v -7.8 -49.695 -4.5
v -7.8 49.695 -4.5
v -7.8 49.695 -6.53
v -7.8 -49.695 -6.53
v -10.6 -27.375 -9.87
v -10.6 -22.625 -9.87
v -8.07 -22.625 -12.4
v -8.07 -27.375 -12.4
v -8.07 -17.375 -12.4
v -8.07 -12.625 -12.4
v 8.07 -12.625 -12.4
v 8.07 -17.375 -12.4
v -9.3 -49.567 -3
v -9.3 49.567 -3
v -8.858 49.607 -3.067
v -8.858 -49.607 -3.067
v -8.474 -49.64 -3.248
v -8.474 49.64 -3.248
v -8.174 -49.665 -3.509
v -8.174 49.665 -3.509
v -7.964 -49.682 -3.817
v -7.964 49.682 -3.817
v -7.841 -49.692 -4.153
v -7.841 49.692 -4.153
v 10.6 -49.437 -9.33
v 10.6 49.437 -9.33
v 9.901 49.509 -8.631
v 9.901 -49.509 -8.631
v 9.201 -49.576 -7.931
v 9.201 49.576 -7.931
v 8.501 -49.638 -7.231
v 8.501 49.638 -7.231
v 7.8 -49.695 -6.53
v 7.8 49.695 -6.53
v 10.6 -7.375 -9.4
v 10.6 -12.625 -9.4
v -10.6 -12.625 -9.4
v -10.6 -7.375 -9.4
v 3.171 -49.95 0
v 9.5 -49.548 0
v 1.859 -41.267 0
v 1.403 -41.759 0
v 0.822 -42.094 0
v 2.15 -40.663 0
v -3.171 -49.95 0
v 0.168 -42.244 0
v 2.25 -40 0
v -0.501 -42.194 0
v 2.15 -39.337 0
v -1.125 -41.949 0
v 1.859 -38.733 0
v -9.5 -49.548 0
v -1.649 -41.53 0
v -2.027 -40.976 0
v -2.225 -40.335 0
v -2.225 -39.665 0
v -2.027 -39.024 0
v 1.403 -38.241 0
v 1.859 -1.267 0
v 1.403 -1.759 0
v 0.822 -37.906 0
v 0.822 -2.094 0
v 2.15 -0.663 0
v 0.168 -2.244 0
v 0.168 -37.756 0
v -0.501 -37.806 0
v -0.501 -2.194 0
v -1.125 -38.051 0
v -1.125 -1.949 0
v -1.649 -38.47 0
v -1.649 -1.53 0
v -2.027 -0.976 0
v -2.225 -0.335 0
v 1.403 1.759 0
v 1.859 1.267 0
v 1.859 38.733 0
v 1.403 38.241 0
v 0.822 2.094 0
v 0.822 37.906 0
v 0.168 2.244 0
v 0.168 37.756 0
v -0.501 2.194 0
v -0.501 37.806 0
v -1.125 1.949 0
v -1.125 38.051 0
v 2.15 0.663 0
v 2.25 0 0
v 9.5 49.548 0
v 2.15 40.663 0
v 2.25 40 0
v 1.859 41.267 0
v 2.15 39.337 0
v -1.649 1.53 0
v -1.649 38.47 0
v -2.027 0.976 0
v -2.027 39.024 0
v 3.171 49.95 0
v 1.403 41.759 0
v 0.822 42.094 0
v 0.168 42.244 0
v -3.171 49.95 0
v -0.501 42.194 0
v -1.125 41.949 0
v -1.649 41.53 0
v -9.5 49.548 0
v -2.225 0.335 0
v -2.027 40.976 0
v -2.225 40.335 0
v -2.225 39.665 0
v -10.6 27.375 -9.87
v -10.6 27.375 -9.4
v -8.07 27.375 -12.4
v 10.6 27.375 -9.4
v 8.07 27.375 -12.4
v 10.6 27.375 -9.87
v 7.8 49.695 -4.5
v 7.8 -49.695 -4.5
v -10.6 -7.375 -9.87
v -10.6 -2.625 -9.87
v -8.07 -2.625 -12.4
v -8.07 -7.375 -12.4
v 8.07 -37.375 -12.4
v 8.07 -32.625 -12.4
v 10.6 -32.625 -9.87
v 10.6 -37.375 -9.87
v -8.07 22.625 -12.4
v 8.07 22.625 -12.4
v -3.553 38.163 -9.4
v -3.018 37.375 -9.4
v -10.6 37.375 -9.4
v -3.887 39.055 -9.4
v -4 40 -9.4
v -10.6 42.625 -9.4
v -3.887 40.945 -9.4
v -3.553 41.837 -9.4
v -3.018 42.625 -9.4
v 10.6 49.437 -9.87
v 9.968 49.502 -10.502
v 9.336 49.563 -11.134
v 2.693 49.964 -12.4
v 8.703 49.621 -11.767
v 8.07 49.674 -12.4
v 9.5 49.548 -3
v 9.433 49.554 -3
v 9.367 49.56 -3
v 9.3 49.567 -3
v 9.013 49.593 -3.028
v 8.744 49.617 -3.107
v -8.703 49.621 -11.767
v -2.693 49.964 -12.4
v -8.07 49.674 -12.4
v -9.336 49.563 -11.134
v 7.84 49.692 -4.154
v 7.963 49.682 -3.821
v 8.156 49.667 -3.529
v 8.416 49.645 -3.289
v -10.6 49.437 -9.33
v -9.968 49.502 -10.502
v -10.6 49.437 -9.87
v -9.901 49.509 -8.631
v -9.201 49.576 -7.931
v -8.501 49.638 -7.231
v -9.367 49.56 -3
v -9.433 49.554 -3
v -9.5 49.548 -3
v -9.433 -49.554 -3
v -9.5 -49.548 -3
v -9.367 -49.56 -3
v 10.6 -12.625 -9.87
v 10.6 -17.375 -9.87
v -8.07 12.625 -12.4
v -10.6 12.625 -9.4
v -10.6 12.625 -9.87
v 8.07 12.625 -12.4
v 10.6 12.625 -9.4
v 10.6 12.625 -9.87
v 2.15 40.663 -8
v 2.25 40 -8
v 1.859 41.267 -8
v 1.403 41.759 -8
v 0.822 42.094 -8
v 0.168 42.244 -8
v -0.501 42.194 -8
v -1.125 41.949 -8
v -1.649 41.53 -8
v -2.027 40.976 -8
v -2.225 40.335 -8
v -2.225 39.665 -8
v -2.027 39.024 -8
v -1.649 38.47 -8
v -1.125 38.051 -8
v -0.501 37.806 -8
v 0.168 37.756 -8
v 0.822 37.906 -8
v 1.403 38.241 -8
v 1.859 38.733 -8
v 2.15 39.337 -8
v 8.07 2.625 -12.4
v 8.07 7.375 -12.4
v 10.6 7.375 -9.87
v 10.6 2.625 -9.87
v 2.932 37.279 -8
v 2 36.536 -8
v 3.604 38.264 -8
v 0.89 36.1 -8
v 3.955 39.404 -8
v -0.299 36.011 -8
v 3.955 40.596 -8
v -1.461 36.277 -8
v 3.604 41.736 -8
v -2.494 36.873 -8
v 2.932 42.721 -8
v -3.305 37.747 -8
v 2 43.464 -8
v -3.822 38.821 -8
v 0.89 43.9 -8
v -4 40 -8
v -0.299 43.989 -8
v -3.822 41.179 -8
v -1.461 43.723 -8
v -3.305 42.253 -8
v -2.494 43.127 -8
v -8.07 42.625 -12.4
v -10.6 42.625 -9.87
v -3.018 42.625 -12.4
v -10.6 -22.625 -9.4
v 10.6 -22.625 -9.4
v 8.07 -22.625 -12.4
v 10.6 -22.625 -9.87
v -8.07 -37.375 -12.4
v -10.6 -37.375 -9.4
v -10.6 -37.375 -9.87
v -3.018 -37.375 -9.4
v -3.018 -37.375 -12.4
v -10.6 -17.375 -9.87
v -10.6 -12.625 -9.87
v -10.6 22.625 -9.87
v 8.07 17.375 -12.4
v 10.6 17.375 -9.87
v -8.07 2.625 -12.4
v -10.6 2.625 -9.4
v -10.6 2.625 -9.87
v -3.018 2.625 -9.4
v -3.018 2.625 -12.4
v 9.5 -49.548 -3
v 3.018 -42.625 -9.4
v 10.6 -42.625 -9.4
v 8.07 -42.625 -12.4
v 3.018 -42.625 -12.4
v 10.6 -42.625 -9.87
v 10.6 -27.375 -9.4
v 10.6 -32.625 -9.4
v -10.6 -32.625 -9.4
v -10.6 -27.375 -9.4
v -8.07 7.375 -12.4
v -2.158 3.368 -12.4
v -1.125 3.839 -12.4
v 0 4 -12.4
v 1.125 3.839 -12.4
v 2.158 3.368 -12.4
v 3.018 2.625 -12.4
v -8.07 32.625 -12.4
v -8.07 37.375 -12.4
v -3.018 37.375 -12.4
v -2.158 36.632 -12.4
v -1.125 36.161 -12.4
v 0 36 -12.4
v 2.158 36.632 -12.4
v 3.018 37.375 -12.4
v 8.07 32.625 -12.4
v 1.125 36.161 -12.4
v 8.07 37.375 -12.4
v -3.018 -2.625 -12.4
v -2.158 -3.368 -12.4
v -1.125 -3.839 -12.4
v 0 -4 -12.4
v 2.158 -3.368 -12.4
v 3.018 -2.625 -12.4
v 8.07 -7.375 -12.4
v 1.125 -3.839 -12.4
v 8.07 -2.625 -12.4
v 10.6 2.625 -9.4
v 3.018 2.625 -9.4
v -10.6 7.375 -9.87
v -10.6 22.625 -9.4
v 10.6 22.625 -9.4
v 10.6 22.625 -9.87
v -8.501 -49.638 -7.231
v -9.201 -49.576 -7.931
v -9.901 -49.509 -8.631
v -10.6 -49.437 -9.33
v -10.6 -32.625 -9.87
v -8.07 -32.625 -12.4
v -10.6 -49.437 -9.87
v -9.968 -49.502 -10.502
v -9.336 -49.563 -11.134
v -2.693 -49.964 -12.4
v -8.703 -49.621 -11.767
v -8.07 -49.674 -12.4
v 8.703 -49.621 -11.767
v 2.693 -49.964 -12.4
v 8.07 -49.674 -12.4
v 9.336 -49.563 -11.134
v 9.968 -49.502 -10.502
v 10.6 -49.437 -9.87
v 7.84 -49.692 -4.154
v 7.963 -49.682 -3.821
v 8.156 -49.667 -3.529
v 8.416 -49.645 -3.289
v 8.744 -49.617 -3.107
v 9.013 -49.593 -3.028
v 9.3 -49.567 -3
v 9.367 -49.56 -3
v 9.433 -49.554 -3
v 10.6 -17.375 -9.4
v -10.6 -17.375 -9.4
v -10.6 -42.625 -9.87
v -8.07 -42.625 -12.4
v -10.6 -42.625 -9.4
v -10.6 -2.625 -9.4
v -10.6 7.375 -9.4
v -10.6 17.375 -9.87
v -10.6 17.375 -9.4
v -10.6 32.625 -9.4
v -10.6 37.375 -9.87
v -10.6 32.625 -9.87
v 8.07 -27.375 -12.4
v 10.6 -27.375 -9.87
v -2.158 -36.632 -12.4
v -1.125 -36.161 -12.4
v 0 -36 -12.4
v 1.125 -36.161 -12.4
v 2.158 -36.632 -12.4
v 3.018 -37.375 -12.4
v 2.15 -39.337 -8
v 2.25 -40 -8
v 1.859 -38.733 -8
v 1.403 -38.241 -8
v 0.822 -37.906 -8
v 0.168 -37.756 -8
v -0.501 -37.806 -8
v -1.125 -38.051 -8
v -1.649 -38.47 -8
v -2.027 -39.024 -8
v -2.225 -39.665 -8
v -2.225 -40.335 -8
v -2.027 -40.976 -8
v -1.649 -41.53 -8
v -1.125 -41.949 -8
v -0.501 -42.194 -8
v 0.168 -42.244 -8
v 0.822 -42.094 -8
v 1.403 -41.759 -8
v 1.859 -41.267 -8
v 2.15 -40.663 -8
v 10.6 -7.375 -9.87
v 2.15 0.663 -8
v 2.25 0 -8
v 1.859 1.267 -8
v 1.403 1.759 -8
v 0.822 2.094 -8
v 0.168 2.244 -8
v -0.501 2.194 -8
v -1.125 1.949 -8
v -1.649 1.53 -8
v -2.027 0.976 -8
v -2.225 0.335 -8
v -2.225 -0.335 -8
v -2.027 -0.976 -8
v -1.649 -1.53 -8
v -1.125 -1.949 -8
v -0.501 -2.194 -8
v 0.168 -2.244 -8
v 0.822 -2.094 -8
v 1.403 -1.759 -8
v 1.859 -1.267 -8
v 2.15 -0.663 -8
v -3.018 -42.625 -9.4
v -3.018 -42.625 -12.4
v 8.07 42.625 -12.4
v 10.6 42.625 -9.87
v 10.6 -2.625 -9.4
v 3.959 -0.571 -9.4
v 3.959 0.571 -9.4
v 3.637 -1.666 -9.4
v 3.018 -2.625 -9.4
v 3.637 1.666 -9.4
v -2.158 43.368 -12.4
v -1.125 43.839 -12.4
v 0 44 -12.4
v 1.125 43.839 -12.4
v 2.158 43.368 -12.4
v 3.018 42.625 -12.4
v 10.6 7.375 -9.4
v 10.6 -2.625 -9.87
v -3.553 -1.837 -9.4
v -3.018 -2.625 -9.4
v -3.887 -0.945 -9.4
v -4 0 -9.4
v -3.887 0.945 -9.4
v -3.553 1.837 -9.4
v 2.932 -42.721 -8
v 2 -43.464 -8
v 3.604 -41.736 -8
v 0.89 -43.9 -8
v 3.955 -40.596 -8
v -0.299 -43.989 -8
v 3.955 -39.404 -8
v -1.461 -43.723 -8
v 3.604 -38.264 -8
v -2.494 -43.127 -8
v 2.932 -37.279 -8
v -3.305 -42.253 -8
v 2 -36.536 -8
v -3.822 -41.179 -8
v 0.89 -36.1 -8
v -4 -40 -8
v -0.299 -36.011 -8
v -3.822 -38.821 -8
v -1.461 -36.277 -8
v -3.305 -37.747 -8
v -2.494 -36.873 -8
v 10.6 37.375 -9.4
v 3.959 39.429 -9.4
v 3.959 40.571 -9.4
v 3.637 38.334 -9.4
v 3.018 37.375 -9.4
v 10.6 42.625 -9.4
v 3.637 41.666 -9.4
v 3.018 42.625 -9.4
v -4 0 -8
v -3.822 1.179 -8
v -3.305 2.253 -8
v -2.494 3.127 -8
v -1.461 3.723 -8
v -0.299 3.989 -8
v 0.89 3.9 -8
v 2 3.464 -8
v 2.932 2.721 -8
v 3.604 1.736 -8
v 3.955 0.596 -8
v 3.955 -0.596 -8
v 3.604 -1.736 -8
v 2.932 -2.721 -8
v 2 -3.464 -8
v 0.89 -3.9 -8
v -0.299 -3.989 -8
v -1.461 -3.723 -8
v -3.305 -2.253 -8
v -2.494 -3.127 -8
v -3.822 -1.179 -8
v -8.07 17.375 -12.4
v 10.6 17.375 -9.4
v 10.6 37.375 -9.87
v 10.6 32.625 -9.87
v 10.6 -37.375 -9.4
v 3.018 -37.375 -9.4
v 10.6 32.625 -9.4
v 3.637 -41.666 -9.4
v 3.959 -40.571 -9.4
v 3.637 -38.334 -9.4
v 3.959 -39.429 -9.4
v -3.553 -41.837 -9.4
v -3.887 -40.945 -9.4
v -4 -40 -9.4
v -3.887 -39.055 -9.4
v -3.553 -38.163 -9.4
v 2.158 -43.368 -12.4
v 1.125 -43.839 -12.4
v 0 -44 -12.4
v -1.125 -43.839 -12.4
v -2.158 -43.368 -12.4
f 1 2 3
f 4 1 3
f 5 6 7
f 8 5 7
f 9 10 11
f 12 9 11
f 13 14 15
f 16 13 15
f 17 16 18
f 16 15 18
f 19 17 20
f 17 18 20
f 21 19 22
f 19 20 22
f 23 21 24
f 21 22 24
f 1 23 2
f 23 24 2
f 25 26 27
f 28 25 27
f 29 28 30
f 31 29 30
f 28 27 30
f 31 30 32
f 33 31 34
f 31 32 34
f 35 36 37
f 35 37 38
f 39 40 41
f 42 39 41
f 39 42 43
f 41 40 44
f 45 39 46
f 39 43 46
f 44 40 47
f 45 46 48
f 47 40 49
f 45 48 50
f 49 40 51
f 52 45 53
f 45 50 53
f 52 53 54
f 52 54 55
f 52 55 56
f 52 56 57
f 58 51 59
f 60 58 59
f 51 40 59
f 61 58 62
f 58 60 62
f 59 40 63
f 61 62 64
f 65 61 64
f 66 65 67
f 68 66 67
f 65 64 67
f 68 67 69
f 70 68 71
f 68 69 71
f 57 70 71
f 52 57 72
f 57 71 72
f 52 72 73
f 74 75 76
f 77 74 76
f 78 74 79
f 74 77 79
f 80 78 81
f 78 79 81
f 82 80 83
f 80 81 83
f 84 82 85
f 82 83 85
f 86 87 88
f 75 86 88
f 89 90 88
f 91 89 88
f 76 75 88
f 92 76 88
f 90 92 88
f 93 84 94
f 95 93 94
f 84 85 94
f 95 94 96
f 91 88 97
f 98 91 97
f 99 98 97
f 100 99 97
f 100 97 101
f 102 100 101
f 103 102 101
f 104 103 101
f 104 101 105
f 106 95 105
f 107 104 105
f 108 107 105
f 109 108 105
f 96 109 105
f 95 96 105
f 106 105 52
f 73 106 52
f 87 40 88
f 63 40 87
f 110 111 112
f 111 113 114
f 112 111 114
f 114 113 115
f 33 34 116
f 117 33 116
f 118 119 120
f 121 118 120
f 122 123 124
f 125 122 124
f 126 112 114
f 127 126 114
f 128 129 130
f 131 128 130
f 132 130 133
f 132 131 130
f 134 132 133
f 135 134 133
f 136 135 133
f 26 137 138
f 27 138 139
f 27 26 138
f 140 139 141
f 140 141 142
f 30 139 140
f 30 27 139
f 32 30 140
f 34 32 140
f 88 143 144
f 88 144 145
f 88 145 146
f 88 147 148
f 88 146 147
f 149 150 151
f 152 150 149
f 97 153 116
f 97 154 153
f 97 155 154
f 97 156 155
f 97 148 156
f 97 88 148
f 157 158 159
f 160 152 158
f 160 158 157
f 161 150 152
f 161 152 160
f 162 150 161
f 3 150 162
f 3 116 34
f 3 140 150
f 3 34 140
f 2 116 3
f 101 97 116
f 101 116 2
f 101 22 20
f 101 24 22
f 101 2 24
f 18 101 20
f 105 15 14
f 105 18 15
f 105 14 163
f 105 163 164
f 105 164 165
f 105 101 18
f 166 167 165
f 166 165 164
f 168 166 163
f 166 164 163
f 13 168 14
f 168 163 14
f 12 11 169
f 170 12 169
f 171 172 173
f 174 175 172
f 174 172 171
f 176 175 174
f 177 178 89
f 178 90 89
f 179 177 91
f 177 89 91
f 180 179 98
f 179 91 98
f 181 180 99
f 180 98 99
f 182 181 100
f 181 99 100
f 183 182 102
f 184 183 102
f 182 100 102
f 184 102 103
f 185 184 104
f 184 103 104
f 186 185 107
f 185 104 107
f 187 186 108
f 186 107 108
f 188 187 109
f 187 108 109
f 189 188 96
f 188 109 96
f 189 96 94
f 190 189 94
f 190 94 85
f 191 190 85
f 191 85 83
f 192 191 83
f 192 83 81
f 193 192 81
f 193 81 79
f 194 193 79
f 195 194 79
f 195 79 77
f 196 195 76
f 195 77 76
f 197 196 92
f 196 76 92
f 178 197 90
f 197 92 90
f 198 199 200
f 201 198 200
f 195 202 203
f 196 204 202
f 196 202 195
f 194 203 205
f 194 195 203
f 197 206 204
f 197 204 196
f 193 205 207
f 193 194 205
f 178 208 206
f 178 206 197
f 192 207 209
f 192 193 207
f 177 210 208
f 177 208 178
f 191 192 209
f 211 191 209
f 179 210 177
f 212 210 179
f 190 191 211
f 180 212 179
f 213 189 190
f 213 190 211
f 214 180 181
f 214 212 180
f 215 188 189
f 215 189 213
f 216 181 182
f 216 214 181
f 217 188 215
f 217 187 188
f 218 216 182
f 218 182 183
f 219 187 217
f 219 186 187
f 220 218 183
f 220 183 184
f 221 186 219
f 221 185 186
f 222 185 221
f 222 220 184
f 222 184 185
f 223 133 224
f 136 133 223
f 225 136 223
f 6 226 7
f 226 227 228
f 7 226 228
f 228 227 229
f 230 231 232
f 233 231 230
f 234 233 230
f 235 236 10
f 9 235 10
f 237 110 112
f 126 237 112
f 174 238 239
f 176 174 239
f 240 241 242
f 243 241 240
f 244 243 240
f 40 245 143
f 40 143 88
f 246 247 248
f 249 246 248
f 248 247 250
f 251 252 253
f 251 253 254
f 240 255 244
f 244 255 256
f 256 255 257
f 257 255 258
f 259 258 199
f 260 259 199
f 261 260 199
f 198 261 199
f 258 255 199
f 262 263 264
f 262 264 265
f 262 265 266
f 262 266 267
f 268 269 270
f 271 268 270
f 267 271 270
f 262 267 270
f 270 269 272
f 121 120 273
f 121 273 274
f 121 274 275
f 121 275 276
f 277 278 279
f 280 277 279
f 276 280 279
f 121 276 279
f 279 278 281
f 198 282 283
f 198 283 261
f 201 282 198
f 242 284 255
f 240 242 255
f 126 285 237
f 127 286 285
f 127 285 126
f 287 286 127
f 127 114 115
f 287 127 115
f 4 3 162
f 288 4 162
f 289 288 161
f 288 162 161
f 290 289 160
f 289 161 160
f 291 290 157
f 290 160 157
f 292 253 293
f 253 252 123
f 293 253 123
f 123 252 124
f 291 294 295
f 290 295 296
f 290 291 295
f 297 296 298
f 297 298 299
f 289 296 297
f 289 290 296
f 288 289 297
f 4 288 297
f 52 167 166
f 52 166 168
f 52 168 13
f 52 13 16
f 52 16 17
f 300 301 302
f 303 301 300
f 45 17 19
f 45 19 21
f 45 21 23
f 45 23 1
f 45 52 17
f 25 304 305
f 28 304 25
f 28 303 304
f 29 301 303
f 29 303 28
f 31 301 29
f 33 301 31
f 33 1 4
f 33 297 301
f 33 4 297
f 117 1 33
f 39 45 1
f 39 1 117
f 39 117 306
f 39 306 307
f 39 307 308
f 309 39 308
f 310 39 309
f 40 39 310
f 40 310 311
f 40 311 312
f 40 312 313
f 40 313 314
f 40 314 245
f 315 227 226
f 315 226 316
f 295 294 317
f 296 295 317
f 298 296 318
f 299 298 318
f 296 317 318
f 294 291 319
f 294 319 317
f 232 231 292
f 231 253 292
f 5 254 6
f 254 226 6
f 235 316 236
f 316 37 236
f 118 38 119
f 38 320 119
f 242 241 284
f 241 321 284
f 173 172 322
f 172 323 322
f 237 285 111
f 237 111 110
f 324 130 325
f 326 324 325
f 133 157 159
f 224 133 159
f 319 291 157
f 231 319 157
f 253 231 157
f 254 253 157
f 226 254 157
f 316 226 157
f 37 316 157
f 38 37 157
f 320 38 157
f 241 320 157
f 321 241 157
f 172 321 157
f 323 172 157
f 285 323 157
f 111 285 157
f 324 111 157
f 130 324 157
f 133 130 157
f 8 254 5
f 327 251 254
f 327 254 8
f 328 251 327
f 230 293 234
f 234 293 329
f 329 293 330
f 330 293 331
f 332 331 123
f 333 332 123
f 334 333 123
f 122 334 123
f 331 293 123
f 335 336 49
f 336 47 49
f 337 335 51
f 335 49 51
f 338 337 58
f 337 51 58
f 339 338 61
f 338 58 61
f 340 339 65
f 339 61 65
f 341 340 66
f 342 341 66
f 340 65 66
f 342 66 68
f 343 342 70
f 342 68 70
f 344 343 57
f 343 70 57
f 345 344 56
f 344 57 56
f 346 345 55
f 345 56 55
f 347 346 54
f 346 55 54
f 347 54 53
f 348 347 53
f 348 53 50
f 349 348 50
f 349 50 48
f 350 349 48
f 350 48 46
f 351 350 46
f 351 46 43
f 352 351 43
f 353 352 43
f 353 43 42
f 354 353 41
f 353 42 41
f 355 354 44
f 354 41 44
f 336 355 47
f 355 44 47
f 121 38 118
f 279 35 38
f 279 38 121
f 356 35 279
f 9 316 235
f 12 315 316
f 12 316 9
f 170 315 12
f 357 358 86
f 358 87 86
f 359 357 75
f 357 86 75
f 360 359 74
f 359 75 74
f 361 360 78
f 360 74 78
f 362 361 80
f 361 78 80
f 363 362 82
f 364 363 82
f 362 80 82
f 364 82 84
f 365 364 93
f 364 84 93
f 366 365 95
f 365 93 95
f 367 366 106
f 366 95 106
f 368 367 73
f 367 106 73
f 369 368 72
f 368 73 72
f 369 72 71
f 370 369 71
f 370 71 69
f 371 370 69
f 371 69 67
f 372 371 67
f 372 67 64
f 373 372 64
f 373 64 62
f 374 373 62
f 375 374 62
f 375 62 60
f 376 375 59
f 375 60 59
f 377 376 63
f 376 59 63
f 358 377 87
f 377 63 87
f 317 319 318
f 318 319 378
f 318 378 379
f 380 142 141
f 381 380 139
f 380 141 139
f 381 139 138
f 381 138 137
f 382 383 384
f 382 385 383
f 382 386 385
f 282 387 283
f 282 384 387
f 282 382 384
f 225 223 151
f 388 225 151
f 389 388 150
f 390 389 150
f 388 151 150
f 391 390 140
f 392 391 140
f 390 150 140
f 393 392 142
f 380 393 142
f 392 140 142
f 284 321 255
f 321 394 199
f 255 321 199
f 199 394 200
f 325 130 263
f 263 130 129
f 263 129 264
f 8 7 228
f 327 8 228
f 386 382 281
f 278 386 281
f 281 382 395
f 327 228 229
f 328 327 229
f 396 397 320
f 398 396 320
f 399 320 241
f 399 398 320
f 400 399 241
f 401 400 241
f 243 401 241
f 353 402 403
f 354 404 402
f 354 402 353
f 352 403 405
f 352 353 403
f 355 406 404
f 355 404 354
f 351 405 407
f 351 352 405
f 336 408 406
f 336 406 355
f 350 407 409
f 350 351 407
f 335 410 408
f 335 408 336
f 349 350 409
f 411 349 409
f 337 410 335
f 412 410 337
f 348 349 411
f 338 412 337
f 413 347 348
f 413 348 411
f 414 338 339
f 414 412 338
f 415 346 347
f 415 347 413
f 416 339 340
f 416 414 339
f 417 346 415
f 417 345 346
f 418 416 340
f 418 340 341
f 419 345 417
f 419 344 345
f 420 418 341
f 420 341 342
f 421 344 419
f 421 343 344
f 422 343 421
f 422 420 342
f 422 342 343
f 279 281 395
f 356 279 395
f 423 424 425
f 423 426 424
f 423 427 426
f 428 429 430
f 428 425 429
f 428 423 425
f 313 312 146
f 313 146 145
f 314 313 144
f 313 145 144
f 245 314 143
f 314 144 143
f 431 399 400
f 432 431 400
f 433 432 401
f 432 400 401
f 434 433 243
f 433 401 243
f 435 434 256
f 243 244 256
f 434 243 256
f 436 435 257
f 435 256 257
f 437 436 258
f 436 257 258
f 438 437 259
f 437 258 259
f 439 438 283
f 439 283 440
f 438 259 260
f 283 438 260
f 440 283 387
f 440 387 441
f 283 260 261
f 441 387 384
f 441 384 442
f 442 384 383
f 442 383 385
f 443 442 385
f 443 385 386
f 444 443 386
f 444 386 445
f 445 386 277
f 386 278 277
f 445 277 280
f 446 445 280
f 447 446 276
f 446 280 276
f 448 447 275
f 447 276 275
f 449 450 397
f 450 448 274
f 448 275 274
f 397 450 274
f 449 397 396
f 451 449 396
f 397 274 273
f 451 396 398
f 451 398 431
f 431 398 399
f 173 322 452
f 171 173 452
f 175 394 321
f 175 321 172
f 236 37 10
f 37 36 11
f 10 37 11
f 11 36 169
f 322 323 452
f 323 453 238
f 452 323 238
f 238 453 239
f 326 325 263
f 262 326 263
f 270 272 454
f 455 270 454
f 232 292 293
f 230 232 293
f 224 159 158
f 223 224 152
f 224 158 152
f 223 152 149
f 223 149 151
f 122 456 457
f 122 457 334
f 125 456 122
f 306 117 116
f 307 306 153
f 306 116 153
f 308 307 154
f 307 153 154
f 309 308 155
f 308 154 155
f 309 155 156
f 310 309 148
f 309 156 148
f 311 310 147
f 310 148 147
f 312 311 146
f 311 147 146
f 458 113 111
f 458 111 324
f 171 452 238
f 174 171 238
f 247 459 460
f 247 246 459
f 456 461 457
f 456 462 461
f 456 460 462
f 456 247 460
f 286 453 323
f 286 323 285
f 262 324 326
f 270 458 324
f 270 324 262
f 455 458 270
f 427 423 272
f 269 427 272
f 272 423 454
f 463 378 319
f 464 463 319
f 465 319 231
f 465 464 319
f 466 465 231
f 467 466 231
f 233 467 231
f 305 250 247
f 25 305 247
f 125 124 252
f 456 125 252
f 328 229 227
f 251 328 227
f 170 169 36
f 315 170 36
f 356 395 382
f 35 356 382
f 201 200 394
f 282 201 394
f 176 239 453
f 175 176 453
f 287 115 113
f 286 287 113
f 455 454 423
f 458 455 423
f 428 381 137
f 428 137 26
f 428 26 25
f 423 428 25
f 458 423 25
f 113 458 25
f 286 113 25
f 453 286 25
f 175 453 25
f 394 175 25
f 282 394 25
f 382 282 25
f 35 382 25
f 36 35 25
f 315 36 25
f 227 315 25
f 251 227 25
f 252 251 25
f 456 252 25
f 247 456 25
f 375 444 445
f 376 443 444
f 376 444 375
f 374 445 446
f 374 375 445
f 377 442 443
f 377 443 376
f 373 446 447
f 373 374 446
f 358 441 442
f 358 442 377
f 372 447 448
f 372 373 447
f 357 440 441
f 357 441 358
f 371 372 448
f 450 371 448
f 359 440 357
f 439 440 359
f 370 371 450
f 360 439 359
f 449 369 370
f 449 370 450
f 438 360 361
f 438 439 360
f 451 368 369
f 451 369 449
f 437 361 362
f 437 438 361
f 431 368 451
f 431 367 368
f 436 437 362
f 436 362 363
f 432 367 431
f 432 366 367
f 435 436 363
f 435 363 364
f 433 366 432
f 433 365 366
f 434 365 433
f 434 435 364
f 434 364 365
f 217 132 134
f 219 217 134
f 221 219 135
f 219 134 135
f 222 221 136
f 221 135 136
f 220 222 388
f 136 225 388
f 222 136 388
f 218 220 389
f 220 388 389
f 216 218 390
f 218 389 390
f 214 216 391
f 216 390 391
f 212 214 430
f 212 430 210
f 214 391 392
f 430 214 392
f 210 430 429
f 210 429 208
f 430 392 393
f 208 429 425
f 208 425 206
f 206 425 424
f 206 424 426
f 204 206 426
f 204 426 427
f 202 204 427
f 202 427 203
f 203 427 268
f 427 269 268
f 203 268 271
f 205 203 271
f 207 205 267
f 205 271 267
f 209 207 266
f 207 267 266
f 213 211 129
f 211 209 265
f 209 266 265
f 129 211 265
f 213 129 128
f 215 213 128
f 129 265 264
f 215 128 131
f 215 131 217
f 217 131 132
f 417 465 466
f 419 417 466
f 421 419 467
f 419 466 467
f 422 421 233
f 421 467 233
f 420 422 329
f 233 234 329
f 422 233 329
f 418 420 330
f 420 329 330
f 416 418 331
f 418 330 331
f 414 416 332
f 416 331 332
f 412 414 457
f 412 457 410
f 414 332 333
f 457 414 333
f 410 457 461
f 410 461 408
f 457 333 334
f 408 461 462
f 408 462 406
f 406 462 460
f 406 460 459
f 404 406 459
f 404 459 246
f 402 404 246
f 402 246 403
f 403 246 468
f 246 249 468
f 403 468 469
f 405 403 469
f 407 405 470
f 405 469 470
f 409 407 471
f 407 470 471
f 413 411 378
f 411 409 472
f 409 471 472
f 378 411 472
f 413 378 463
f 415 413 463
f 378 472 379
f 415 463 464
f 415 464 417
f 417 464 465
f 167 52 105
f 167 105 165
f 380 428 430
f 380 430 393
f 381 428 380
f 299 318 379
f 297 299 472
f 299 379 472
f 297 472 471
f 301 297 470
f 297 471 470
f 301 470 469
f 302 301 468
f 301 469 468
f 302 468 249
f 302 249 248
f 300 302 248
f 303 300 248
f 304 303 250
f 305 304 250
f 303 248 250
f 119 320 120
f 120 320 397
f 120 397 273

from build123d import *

# Parameters (mm, degrees)
BOSS_EXTRUDE1_DEPTH                                 = 50
SKETCH2_W                                           = 5
SKETCH2_H                                           = 5.25
CUT_EXTRUDE1_DEPTH                                  = 50
LPATTERN1_COUNT                                     = 5
LPATTERN1_PITCH                                     = 10
LPATTERN1_COL_COUNT                                 = 5
LPATTERN1_COL_PITCH                                 = 10
SKETCH3_OUTSIDE_W                                   = 43.794
SKETCH3_OUTSIDE_H                                   = 122.594
CUT_EXTRUDE2_DEPTH                                  = 50
CBORE_FOR_M4_HEX_SOCKET_HEAD_CAP_SCREW1_D           = 4.5
CBORE_FOR_M4_HEX_SOCKET_HEAD_CAP_SCREW1_CBORE_D     = 8
CBORE_FOR_M4_HEX_SOCKET_HEAD_CAP_SCREW1_CBORE_DEPTH = 4.4


with BuildPart() as part:
    # Sketch1 → Boss-Extrude1 (new, symmetric)
    with BuildSketch(Plane(origin=(0, 0, 0), x_dir=(1, 0, 0), z_dir=(0, 1, 0))):
        with BuildLine():
            Line((-8.07, 12.4), (8.07, 12.4))
            Line((8.07, 12.4), (10.6, 9.87))
            Line((10.6, 9.87), (10.6, 9.33))
            Line((10.6, 9.33), (7.8, 6.53))
            Line((7.8, 6.53), (7.8, 4.5))
            ThreePointArc((7.8, 4.5), (8.239339828, 3.439339828), (9.3, 3))
            Line((9.3, 3), (9.5, 3))
            Line((9.5, 3), (9.5, 0))
            Line((9.5, 0), (-9.5, 0))
            Line((-9.5, 0), (-9.5, 3))
            Line((-9.5, 3), (-9.3, 3))
            ThreePointArc((-9.3, 3), (-8.239339828, 3.439339828), (-7.8, 4.5))
            Line((-7.8, 4.5), (-7.8, 6.53))
            Line((-7.8, 6.53), (-10.6, 9.33))
            Line((-10.6, 9.33), (-10.6, 9.87))
            Line((-10.6, 9.87), (-8.07, 12.4))
        make_face()
    extrude(amount=BOSS_EXTRUDE1_DEPTH, both=True)

    # Sketch2 → Cut-Extrude1 (cut, symmetric)
    with BuildSketch(Plane(origin=(0, 0, 0), x_dir=(0, 0, -1), z_dir=(1, 0, 0))):
        with Locations((11.9, 0)):
            Rectangle(SKETCH2_W, SKETCH2_H)
    cut_extrude1 = extrude(amount=CUT_EXTRUDE1_DEPTH, both=True, mode=Mode.SUBTRACT)

    # LPattern1: Cut-Extrude1 ×5
    with Locations(*[(0, i * LPATTERN1_PITCH, 0) for i in range(1, LPATTERN1_COUNT)]):
        add(cut_extrude1, mode=Mode.SUBTRACT)

    # LPattern1 col: Cut-Extrude1 ×5
    with Locations(*[(0, -i * LPATTERN1_COL_PITCH, 0) for i in range(1, LPATTERN1_COL_COUNT)]):
        add(cut_extrude1, mode=Mode.SUBTRACT)

    # Sketch3 outside → Cut-Extrude2 (cut, symmetric)
    with BuildSketch(Plane.XY):
        Rectangle(SKETCH3_OUTSIDE_W, SKETCH3_OUTSIDE_H)
        with BuildLine():
            Line((-15, 48.868599666), (-15, -48.868599666))
            ThreePointArc((-15, -48.868599666), (0, -50), (15, -48.868599666))
            Line((15, -48.868599666), (15, 48.868599666))
            ThreePointArc((15, 48.868599666), (0, 50), (-15, 48.868599666))
        make_face(mode=Mode.SUBTRACT)
    extrude(amount=CUT_EXTRUDE2_DEPTH, both=True, mode=Mode.SUBTRACT)

    # CBORE for M4 Hex Socket Head Cap Screw1 (through all)
    with Locations(Plane(origin=(0, 0, -12.4), x_dir=(-1, 0, 0), z_dir=(0, 0, -1))):
        with Locations((0, 40), (0, -40), (0, 0)):
            CounterBoreHole(CBORE_FOR_M4_HEX_SOCKET_HEAD_CAP_SCREW1_D / 2, CBORE_FOR_M4_HEX_SOCKET_HEAD_CAP_SCREW1_CBORE_D / 2, CBORE_FOR_M4_HEX_SOCKET_HEAD_CAP_SCREW1_CBORE_DEPTH)


solid = part.part
